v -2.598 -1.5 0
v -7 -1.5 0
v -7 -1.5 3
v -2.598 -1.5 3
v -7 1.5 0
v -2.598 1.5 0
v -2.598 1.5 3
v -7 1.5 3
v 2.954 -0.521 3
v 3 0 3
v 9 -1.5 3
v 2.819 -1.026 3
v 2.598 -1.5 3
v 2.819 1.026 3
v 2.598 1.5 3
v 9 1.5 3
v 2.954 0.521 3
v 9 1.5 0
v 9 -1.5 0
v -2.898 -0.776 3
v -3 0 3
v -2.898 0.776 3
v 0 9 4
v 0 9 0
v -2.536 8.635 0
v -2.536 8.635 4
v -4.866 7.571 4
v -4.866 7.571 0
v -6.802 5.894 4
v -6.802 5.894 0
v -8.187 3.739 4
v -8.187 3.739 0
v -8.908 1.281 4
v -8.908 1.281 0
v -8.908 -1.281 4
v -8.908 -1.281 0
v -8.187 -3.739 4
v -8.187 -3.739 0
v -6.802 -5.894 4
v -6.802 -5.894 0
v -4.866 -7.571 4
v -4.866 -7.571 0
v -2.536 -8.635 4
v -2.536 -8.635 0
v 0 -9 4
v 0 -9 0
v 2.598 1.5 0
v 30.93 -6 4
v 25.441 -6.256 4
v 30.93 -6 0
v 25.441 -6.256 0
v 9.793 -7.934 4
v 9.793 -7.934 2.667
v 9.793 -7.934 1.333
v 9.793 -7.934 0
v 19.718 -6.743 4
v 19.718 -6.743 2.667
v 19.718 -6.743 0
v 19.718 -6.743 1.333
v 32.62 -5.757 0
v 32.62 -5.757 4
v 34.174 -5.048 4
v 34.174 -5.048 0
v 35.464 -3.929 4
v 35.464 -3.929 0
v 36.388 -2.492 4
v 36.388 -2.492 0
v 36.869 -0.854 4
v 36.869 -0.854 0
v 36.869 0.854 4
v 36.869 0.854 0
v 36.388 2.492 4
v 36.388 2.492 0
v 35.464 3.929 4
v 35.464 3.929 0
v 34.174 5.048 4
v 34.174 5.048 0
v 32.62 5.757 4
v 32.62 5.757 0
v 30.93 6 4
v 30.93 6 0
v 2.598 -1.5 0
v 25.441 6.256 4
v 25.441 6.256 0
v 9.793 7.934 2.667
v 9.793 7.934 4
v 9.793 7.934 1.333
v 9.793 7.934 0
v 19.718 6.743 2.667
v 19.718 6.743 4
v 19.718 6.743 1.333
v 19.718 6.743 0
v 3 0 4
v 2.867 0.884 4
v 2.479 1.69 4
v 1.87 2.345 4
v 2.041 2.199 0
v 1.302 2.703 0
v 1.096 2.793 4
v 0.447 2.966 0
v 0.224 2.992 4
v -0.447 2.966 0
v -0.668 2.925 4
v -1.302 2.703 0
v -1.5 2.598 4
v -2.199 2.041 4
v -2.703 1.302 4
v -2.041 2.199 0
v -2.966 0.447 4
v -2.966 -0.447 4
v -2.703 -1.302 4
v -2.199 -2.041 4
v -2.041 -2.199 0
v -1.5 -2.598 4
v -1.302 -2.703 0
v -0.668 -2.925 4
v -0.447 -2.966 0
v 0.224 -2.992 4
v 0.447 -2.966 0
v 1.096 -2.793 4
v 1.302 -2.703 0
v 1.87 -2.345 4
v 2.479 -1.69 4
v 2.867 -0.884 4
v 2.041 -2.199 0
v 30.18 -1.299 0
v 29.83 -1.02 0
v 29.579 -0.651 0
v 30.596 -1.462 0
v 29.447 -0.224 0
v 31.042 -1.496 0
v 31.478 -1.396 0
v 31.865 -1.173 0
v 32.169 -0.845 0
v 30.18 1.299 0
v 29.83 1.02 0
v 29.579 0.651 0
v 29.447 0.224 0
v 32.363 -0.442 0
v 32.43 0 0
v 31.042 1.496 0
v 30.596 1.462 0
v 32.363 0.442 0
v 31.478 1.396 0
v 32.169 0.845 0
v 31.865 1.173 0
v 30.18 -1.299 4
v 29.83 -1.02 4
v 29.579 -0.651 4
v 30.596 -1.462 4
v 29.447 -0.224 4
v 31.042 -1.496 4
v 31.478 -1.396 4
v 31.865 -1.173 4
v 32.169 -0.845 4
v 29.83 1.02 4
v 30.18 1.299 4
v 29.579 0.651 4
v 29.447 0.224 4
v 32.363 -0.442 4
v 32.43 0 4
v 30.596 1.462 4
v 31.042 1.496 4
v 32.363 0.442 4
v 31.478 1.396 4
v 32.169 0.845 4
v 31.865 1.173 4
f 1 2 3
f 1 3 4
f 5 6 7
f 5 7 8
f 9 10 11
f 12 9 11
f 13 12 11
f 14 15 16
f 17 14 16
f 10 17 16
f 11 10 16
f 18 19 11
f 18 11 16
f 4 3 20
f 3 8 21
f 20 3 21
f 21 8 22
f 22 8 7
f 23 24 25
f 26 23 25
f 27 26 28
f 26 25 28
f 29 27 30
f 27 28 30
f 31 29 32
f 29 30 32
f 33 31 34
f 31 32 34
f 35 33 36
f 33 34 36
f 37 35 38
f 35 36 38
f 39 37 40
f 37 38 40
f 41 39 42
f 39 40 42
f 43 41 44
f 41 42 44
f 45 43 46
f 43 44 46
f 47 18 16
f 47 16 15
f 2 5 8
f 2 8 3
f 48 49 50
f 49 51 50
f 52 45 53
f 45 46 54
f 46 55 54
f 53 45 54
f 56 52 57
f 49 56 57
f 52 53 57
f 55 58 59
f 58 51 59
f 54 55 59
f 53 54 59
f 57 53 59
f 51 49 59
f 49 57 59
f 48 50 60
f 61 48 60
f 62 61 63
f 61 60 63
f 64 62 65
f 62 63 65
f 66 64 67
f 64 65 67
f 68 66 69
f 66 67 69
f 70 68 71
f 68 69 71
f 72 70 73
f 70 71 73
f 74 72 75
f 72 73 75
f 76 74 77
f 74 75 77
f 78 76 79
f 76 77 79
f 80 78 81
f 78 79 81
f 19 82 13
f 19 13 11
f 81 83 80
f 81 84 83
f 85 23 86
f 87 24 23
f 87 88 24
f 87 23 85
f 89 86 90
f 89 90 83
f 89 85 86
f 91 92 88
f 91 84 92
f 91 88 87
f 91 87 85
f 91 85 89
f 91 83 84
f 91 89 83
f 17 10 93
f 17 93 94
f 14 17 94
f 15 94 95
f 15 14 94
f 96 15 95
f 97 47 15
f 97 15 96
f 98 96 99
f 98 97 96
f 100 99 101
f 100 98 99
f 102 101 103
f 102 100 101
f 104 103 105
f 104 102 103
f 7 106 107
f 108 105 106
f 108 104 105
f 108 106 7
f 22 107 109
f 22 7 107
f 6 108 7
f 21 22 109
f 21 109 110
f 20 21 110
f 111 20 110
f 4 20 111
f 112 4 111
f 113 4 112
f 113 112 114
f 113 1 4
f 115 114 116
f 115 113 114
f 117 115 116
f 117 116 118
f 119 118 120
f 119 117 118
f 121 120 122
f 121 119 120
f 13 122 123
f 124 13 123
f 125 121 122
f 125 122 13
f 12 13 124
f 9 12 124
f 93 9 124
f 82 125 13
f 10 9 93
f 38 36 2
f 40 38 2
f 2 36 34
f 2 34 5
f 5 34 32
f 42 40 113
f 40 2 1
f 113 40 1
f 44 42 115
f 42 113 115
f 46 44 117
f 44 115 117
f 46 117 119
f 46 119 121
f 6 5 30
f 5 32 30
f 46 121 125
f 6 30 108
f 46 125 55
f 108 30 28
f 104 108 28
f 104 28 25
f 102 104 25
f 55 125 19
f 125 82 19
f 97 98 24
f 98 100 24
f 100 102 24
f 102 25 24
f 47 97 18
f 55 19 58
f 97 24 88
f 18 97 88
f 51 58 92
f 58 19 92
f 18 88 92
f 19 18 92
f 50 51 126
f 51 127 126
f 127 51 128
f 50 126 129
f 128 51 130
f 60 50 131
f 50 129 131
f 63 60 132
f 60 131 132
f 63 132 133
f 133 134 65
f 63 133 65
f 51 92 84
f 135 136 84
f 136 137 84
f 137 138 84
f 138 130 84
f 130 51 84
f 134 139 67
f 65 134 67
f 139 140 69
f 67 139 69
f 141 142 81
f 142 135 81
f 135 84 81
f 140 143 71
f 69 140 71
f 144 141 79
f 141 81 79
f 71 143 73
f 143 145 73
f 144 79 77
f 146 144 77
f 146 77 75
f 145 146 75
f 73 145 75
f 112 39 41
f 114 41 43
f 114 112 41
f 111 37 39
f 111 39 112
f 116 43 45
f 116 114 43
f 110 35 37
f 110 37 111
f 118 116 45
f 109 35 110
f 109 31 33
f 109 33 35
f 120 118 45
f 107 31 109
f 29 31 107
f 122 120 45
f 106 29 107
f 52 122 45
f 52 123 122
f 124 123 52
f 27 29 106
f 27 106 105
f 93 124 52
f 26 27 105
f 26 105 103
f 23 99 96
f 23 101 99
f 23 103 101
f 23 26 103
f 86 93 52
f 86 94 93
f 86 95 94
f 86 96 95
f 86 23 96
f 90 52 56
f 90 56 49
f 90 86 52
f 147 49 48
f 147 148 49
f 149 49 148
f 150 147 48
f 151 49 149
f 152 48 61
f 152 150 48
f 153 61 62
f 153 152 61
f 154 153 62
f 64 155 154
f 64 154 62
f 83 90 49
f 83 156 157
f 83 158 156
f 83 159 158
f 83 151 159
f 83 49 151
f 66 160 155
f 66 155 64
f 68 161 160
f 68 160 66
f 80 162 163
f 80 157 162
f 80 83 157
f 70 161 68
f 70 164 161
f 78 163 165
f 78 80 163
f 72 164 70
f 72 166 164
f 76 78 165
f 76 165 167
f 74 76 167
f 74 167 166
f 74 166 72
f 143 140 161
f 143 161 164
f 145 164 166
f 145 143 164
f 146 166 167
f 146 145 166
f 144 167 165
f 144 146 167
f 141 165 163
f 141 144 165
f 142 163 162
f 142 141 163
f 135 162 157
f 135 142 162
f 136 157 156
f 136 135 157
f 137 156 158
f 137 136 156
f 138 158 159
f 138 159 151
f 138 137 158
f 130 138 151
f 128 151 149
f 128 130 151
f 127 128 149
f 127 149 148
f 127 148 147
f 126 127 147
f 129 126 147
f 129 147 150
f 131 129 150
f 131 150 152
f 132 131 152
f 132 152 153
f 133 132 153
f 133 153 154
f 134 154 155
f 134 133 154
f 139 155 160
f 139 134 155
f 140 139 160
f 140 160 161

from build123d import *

# Parameters (mm, degrees)
SKETCH_1_R          = 3
SKETCH_1_R_2        = 1.5
EXTRUDE_1_DEPTH     = 4
CUT_EXTRUDE_1_DEPTH = 3


with BuildPart() as part:
    # 草图1 → 凸台-拉伸1 (new body)
    with BuildSketch(Plane.XY):
        with BuildLine():
            ThreePointArc((0, 9), (-9, 0), (0, -9))
            add(Edge.make_bspline(
                [(0, -9), (10.112579717, -8.18843742), (18.689885647, -6.328249505), (30.93, -6)],
                knots=[0, 0, 0, 0, 1, 1, 1, 1], degree=3))
            ThreePointArc((30.93, -6), (36.93, 0), (30.93, 6))
            add(Edge.make_bspline(
                [(0, 9), (10.112579717, 8.18843742), (18.689885647, 6.328249505), (30.93, 6)],
                knots=[0, 0, 0, 0, 1, 1, 1, 1], degree=3))
        make_face()
        Circle(SKETCH_1_R, mode=Mode.SUBTRACT)
        with Locations((30.93, 0)):
            Circle(SKETCH_1_R_2, mode=Mode.SUBTRACT)
    extrude(amount=EXTRUDE_1_DEPTH)

    # 草图2 → 切除-拉伸1 (cut)
    with BuildSketch(Plane.XY):
        Polygon((-2.598076211, 1.5), (-7, 1.5), (-7, -1.5), (9, -1.5), (9, 1.5), align=None)
    extrude(amount=CUT_EXTRUDE_1_DEPTH, mode=Mode.SUBTRACT)


solid = part.part
